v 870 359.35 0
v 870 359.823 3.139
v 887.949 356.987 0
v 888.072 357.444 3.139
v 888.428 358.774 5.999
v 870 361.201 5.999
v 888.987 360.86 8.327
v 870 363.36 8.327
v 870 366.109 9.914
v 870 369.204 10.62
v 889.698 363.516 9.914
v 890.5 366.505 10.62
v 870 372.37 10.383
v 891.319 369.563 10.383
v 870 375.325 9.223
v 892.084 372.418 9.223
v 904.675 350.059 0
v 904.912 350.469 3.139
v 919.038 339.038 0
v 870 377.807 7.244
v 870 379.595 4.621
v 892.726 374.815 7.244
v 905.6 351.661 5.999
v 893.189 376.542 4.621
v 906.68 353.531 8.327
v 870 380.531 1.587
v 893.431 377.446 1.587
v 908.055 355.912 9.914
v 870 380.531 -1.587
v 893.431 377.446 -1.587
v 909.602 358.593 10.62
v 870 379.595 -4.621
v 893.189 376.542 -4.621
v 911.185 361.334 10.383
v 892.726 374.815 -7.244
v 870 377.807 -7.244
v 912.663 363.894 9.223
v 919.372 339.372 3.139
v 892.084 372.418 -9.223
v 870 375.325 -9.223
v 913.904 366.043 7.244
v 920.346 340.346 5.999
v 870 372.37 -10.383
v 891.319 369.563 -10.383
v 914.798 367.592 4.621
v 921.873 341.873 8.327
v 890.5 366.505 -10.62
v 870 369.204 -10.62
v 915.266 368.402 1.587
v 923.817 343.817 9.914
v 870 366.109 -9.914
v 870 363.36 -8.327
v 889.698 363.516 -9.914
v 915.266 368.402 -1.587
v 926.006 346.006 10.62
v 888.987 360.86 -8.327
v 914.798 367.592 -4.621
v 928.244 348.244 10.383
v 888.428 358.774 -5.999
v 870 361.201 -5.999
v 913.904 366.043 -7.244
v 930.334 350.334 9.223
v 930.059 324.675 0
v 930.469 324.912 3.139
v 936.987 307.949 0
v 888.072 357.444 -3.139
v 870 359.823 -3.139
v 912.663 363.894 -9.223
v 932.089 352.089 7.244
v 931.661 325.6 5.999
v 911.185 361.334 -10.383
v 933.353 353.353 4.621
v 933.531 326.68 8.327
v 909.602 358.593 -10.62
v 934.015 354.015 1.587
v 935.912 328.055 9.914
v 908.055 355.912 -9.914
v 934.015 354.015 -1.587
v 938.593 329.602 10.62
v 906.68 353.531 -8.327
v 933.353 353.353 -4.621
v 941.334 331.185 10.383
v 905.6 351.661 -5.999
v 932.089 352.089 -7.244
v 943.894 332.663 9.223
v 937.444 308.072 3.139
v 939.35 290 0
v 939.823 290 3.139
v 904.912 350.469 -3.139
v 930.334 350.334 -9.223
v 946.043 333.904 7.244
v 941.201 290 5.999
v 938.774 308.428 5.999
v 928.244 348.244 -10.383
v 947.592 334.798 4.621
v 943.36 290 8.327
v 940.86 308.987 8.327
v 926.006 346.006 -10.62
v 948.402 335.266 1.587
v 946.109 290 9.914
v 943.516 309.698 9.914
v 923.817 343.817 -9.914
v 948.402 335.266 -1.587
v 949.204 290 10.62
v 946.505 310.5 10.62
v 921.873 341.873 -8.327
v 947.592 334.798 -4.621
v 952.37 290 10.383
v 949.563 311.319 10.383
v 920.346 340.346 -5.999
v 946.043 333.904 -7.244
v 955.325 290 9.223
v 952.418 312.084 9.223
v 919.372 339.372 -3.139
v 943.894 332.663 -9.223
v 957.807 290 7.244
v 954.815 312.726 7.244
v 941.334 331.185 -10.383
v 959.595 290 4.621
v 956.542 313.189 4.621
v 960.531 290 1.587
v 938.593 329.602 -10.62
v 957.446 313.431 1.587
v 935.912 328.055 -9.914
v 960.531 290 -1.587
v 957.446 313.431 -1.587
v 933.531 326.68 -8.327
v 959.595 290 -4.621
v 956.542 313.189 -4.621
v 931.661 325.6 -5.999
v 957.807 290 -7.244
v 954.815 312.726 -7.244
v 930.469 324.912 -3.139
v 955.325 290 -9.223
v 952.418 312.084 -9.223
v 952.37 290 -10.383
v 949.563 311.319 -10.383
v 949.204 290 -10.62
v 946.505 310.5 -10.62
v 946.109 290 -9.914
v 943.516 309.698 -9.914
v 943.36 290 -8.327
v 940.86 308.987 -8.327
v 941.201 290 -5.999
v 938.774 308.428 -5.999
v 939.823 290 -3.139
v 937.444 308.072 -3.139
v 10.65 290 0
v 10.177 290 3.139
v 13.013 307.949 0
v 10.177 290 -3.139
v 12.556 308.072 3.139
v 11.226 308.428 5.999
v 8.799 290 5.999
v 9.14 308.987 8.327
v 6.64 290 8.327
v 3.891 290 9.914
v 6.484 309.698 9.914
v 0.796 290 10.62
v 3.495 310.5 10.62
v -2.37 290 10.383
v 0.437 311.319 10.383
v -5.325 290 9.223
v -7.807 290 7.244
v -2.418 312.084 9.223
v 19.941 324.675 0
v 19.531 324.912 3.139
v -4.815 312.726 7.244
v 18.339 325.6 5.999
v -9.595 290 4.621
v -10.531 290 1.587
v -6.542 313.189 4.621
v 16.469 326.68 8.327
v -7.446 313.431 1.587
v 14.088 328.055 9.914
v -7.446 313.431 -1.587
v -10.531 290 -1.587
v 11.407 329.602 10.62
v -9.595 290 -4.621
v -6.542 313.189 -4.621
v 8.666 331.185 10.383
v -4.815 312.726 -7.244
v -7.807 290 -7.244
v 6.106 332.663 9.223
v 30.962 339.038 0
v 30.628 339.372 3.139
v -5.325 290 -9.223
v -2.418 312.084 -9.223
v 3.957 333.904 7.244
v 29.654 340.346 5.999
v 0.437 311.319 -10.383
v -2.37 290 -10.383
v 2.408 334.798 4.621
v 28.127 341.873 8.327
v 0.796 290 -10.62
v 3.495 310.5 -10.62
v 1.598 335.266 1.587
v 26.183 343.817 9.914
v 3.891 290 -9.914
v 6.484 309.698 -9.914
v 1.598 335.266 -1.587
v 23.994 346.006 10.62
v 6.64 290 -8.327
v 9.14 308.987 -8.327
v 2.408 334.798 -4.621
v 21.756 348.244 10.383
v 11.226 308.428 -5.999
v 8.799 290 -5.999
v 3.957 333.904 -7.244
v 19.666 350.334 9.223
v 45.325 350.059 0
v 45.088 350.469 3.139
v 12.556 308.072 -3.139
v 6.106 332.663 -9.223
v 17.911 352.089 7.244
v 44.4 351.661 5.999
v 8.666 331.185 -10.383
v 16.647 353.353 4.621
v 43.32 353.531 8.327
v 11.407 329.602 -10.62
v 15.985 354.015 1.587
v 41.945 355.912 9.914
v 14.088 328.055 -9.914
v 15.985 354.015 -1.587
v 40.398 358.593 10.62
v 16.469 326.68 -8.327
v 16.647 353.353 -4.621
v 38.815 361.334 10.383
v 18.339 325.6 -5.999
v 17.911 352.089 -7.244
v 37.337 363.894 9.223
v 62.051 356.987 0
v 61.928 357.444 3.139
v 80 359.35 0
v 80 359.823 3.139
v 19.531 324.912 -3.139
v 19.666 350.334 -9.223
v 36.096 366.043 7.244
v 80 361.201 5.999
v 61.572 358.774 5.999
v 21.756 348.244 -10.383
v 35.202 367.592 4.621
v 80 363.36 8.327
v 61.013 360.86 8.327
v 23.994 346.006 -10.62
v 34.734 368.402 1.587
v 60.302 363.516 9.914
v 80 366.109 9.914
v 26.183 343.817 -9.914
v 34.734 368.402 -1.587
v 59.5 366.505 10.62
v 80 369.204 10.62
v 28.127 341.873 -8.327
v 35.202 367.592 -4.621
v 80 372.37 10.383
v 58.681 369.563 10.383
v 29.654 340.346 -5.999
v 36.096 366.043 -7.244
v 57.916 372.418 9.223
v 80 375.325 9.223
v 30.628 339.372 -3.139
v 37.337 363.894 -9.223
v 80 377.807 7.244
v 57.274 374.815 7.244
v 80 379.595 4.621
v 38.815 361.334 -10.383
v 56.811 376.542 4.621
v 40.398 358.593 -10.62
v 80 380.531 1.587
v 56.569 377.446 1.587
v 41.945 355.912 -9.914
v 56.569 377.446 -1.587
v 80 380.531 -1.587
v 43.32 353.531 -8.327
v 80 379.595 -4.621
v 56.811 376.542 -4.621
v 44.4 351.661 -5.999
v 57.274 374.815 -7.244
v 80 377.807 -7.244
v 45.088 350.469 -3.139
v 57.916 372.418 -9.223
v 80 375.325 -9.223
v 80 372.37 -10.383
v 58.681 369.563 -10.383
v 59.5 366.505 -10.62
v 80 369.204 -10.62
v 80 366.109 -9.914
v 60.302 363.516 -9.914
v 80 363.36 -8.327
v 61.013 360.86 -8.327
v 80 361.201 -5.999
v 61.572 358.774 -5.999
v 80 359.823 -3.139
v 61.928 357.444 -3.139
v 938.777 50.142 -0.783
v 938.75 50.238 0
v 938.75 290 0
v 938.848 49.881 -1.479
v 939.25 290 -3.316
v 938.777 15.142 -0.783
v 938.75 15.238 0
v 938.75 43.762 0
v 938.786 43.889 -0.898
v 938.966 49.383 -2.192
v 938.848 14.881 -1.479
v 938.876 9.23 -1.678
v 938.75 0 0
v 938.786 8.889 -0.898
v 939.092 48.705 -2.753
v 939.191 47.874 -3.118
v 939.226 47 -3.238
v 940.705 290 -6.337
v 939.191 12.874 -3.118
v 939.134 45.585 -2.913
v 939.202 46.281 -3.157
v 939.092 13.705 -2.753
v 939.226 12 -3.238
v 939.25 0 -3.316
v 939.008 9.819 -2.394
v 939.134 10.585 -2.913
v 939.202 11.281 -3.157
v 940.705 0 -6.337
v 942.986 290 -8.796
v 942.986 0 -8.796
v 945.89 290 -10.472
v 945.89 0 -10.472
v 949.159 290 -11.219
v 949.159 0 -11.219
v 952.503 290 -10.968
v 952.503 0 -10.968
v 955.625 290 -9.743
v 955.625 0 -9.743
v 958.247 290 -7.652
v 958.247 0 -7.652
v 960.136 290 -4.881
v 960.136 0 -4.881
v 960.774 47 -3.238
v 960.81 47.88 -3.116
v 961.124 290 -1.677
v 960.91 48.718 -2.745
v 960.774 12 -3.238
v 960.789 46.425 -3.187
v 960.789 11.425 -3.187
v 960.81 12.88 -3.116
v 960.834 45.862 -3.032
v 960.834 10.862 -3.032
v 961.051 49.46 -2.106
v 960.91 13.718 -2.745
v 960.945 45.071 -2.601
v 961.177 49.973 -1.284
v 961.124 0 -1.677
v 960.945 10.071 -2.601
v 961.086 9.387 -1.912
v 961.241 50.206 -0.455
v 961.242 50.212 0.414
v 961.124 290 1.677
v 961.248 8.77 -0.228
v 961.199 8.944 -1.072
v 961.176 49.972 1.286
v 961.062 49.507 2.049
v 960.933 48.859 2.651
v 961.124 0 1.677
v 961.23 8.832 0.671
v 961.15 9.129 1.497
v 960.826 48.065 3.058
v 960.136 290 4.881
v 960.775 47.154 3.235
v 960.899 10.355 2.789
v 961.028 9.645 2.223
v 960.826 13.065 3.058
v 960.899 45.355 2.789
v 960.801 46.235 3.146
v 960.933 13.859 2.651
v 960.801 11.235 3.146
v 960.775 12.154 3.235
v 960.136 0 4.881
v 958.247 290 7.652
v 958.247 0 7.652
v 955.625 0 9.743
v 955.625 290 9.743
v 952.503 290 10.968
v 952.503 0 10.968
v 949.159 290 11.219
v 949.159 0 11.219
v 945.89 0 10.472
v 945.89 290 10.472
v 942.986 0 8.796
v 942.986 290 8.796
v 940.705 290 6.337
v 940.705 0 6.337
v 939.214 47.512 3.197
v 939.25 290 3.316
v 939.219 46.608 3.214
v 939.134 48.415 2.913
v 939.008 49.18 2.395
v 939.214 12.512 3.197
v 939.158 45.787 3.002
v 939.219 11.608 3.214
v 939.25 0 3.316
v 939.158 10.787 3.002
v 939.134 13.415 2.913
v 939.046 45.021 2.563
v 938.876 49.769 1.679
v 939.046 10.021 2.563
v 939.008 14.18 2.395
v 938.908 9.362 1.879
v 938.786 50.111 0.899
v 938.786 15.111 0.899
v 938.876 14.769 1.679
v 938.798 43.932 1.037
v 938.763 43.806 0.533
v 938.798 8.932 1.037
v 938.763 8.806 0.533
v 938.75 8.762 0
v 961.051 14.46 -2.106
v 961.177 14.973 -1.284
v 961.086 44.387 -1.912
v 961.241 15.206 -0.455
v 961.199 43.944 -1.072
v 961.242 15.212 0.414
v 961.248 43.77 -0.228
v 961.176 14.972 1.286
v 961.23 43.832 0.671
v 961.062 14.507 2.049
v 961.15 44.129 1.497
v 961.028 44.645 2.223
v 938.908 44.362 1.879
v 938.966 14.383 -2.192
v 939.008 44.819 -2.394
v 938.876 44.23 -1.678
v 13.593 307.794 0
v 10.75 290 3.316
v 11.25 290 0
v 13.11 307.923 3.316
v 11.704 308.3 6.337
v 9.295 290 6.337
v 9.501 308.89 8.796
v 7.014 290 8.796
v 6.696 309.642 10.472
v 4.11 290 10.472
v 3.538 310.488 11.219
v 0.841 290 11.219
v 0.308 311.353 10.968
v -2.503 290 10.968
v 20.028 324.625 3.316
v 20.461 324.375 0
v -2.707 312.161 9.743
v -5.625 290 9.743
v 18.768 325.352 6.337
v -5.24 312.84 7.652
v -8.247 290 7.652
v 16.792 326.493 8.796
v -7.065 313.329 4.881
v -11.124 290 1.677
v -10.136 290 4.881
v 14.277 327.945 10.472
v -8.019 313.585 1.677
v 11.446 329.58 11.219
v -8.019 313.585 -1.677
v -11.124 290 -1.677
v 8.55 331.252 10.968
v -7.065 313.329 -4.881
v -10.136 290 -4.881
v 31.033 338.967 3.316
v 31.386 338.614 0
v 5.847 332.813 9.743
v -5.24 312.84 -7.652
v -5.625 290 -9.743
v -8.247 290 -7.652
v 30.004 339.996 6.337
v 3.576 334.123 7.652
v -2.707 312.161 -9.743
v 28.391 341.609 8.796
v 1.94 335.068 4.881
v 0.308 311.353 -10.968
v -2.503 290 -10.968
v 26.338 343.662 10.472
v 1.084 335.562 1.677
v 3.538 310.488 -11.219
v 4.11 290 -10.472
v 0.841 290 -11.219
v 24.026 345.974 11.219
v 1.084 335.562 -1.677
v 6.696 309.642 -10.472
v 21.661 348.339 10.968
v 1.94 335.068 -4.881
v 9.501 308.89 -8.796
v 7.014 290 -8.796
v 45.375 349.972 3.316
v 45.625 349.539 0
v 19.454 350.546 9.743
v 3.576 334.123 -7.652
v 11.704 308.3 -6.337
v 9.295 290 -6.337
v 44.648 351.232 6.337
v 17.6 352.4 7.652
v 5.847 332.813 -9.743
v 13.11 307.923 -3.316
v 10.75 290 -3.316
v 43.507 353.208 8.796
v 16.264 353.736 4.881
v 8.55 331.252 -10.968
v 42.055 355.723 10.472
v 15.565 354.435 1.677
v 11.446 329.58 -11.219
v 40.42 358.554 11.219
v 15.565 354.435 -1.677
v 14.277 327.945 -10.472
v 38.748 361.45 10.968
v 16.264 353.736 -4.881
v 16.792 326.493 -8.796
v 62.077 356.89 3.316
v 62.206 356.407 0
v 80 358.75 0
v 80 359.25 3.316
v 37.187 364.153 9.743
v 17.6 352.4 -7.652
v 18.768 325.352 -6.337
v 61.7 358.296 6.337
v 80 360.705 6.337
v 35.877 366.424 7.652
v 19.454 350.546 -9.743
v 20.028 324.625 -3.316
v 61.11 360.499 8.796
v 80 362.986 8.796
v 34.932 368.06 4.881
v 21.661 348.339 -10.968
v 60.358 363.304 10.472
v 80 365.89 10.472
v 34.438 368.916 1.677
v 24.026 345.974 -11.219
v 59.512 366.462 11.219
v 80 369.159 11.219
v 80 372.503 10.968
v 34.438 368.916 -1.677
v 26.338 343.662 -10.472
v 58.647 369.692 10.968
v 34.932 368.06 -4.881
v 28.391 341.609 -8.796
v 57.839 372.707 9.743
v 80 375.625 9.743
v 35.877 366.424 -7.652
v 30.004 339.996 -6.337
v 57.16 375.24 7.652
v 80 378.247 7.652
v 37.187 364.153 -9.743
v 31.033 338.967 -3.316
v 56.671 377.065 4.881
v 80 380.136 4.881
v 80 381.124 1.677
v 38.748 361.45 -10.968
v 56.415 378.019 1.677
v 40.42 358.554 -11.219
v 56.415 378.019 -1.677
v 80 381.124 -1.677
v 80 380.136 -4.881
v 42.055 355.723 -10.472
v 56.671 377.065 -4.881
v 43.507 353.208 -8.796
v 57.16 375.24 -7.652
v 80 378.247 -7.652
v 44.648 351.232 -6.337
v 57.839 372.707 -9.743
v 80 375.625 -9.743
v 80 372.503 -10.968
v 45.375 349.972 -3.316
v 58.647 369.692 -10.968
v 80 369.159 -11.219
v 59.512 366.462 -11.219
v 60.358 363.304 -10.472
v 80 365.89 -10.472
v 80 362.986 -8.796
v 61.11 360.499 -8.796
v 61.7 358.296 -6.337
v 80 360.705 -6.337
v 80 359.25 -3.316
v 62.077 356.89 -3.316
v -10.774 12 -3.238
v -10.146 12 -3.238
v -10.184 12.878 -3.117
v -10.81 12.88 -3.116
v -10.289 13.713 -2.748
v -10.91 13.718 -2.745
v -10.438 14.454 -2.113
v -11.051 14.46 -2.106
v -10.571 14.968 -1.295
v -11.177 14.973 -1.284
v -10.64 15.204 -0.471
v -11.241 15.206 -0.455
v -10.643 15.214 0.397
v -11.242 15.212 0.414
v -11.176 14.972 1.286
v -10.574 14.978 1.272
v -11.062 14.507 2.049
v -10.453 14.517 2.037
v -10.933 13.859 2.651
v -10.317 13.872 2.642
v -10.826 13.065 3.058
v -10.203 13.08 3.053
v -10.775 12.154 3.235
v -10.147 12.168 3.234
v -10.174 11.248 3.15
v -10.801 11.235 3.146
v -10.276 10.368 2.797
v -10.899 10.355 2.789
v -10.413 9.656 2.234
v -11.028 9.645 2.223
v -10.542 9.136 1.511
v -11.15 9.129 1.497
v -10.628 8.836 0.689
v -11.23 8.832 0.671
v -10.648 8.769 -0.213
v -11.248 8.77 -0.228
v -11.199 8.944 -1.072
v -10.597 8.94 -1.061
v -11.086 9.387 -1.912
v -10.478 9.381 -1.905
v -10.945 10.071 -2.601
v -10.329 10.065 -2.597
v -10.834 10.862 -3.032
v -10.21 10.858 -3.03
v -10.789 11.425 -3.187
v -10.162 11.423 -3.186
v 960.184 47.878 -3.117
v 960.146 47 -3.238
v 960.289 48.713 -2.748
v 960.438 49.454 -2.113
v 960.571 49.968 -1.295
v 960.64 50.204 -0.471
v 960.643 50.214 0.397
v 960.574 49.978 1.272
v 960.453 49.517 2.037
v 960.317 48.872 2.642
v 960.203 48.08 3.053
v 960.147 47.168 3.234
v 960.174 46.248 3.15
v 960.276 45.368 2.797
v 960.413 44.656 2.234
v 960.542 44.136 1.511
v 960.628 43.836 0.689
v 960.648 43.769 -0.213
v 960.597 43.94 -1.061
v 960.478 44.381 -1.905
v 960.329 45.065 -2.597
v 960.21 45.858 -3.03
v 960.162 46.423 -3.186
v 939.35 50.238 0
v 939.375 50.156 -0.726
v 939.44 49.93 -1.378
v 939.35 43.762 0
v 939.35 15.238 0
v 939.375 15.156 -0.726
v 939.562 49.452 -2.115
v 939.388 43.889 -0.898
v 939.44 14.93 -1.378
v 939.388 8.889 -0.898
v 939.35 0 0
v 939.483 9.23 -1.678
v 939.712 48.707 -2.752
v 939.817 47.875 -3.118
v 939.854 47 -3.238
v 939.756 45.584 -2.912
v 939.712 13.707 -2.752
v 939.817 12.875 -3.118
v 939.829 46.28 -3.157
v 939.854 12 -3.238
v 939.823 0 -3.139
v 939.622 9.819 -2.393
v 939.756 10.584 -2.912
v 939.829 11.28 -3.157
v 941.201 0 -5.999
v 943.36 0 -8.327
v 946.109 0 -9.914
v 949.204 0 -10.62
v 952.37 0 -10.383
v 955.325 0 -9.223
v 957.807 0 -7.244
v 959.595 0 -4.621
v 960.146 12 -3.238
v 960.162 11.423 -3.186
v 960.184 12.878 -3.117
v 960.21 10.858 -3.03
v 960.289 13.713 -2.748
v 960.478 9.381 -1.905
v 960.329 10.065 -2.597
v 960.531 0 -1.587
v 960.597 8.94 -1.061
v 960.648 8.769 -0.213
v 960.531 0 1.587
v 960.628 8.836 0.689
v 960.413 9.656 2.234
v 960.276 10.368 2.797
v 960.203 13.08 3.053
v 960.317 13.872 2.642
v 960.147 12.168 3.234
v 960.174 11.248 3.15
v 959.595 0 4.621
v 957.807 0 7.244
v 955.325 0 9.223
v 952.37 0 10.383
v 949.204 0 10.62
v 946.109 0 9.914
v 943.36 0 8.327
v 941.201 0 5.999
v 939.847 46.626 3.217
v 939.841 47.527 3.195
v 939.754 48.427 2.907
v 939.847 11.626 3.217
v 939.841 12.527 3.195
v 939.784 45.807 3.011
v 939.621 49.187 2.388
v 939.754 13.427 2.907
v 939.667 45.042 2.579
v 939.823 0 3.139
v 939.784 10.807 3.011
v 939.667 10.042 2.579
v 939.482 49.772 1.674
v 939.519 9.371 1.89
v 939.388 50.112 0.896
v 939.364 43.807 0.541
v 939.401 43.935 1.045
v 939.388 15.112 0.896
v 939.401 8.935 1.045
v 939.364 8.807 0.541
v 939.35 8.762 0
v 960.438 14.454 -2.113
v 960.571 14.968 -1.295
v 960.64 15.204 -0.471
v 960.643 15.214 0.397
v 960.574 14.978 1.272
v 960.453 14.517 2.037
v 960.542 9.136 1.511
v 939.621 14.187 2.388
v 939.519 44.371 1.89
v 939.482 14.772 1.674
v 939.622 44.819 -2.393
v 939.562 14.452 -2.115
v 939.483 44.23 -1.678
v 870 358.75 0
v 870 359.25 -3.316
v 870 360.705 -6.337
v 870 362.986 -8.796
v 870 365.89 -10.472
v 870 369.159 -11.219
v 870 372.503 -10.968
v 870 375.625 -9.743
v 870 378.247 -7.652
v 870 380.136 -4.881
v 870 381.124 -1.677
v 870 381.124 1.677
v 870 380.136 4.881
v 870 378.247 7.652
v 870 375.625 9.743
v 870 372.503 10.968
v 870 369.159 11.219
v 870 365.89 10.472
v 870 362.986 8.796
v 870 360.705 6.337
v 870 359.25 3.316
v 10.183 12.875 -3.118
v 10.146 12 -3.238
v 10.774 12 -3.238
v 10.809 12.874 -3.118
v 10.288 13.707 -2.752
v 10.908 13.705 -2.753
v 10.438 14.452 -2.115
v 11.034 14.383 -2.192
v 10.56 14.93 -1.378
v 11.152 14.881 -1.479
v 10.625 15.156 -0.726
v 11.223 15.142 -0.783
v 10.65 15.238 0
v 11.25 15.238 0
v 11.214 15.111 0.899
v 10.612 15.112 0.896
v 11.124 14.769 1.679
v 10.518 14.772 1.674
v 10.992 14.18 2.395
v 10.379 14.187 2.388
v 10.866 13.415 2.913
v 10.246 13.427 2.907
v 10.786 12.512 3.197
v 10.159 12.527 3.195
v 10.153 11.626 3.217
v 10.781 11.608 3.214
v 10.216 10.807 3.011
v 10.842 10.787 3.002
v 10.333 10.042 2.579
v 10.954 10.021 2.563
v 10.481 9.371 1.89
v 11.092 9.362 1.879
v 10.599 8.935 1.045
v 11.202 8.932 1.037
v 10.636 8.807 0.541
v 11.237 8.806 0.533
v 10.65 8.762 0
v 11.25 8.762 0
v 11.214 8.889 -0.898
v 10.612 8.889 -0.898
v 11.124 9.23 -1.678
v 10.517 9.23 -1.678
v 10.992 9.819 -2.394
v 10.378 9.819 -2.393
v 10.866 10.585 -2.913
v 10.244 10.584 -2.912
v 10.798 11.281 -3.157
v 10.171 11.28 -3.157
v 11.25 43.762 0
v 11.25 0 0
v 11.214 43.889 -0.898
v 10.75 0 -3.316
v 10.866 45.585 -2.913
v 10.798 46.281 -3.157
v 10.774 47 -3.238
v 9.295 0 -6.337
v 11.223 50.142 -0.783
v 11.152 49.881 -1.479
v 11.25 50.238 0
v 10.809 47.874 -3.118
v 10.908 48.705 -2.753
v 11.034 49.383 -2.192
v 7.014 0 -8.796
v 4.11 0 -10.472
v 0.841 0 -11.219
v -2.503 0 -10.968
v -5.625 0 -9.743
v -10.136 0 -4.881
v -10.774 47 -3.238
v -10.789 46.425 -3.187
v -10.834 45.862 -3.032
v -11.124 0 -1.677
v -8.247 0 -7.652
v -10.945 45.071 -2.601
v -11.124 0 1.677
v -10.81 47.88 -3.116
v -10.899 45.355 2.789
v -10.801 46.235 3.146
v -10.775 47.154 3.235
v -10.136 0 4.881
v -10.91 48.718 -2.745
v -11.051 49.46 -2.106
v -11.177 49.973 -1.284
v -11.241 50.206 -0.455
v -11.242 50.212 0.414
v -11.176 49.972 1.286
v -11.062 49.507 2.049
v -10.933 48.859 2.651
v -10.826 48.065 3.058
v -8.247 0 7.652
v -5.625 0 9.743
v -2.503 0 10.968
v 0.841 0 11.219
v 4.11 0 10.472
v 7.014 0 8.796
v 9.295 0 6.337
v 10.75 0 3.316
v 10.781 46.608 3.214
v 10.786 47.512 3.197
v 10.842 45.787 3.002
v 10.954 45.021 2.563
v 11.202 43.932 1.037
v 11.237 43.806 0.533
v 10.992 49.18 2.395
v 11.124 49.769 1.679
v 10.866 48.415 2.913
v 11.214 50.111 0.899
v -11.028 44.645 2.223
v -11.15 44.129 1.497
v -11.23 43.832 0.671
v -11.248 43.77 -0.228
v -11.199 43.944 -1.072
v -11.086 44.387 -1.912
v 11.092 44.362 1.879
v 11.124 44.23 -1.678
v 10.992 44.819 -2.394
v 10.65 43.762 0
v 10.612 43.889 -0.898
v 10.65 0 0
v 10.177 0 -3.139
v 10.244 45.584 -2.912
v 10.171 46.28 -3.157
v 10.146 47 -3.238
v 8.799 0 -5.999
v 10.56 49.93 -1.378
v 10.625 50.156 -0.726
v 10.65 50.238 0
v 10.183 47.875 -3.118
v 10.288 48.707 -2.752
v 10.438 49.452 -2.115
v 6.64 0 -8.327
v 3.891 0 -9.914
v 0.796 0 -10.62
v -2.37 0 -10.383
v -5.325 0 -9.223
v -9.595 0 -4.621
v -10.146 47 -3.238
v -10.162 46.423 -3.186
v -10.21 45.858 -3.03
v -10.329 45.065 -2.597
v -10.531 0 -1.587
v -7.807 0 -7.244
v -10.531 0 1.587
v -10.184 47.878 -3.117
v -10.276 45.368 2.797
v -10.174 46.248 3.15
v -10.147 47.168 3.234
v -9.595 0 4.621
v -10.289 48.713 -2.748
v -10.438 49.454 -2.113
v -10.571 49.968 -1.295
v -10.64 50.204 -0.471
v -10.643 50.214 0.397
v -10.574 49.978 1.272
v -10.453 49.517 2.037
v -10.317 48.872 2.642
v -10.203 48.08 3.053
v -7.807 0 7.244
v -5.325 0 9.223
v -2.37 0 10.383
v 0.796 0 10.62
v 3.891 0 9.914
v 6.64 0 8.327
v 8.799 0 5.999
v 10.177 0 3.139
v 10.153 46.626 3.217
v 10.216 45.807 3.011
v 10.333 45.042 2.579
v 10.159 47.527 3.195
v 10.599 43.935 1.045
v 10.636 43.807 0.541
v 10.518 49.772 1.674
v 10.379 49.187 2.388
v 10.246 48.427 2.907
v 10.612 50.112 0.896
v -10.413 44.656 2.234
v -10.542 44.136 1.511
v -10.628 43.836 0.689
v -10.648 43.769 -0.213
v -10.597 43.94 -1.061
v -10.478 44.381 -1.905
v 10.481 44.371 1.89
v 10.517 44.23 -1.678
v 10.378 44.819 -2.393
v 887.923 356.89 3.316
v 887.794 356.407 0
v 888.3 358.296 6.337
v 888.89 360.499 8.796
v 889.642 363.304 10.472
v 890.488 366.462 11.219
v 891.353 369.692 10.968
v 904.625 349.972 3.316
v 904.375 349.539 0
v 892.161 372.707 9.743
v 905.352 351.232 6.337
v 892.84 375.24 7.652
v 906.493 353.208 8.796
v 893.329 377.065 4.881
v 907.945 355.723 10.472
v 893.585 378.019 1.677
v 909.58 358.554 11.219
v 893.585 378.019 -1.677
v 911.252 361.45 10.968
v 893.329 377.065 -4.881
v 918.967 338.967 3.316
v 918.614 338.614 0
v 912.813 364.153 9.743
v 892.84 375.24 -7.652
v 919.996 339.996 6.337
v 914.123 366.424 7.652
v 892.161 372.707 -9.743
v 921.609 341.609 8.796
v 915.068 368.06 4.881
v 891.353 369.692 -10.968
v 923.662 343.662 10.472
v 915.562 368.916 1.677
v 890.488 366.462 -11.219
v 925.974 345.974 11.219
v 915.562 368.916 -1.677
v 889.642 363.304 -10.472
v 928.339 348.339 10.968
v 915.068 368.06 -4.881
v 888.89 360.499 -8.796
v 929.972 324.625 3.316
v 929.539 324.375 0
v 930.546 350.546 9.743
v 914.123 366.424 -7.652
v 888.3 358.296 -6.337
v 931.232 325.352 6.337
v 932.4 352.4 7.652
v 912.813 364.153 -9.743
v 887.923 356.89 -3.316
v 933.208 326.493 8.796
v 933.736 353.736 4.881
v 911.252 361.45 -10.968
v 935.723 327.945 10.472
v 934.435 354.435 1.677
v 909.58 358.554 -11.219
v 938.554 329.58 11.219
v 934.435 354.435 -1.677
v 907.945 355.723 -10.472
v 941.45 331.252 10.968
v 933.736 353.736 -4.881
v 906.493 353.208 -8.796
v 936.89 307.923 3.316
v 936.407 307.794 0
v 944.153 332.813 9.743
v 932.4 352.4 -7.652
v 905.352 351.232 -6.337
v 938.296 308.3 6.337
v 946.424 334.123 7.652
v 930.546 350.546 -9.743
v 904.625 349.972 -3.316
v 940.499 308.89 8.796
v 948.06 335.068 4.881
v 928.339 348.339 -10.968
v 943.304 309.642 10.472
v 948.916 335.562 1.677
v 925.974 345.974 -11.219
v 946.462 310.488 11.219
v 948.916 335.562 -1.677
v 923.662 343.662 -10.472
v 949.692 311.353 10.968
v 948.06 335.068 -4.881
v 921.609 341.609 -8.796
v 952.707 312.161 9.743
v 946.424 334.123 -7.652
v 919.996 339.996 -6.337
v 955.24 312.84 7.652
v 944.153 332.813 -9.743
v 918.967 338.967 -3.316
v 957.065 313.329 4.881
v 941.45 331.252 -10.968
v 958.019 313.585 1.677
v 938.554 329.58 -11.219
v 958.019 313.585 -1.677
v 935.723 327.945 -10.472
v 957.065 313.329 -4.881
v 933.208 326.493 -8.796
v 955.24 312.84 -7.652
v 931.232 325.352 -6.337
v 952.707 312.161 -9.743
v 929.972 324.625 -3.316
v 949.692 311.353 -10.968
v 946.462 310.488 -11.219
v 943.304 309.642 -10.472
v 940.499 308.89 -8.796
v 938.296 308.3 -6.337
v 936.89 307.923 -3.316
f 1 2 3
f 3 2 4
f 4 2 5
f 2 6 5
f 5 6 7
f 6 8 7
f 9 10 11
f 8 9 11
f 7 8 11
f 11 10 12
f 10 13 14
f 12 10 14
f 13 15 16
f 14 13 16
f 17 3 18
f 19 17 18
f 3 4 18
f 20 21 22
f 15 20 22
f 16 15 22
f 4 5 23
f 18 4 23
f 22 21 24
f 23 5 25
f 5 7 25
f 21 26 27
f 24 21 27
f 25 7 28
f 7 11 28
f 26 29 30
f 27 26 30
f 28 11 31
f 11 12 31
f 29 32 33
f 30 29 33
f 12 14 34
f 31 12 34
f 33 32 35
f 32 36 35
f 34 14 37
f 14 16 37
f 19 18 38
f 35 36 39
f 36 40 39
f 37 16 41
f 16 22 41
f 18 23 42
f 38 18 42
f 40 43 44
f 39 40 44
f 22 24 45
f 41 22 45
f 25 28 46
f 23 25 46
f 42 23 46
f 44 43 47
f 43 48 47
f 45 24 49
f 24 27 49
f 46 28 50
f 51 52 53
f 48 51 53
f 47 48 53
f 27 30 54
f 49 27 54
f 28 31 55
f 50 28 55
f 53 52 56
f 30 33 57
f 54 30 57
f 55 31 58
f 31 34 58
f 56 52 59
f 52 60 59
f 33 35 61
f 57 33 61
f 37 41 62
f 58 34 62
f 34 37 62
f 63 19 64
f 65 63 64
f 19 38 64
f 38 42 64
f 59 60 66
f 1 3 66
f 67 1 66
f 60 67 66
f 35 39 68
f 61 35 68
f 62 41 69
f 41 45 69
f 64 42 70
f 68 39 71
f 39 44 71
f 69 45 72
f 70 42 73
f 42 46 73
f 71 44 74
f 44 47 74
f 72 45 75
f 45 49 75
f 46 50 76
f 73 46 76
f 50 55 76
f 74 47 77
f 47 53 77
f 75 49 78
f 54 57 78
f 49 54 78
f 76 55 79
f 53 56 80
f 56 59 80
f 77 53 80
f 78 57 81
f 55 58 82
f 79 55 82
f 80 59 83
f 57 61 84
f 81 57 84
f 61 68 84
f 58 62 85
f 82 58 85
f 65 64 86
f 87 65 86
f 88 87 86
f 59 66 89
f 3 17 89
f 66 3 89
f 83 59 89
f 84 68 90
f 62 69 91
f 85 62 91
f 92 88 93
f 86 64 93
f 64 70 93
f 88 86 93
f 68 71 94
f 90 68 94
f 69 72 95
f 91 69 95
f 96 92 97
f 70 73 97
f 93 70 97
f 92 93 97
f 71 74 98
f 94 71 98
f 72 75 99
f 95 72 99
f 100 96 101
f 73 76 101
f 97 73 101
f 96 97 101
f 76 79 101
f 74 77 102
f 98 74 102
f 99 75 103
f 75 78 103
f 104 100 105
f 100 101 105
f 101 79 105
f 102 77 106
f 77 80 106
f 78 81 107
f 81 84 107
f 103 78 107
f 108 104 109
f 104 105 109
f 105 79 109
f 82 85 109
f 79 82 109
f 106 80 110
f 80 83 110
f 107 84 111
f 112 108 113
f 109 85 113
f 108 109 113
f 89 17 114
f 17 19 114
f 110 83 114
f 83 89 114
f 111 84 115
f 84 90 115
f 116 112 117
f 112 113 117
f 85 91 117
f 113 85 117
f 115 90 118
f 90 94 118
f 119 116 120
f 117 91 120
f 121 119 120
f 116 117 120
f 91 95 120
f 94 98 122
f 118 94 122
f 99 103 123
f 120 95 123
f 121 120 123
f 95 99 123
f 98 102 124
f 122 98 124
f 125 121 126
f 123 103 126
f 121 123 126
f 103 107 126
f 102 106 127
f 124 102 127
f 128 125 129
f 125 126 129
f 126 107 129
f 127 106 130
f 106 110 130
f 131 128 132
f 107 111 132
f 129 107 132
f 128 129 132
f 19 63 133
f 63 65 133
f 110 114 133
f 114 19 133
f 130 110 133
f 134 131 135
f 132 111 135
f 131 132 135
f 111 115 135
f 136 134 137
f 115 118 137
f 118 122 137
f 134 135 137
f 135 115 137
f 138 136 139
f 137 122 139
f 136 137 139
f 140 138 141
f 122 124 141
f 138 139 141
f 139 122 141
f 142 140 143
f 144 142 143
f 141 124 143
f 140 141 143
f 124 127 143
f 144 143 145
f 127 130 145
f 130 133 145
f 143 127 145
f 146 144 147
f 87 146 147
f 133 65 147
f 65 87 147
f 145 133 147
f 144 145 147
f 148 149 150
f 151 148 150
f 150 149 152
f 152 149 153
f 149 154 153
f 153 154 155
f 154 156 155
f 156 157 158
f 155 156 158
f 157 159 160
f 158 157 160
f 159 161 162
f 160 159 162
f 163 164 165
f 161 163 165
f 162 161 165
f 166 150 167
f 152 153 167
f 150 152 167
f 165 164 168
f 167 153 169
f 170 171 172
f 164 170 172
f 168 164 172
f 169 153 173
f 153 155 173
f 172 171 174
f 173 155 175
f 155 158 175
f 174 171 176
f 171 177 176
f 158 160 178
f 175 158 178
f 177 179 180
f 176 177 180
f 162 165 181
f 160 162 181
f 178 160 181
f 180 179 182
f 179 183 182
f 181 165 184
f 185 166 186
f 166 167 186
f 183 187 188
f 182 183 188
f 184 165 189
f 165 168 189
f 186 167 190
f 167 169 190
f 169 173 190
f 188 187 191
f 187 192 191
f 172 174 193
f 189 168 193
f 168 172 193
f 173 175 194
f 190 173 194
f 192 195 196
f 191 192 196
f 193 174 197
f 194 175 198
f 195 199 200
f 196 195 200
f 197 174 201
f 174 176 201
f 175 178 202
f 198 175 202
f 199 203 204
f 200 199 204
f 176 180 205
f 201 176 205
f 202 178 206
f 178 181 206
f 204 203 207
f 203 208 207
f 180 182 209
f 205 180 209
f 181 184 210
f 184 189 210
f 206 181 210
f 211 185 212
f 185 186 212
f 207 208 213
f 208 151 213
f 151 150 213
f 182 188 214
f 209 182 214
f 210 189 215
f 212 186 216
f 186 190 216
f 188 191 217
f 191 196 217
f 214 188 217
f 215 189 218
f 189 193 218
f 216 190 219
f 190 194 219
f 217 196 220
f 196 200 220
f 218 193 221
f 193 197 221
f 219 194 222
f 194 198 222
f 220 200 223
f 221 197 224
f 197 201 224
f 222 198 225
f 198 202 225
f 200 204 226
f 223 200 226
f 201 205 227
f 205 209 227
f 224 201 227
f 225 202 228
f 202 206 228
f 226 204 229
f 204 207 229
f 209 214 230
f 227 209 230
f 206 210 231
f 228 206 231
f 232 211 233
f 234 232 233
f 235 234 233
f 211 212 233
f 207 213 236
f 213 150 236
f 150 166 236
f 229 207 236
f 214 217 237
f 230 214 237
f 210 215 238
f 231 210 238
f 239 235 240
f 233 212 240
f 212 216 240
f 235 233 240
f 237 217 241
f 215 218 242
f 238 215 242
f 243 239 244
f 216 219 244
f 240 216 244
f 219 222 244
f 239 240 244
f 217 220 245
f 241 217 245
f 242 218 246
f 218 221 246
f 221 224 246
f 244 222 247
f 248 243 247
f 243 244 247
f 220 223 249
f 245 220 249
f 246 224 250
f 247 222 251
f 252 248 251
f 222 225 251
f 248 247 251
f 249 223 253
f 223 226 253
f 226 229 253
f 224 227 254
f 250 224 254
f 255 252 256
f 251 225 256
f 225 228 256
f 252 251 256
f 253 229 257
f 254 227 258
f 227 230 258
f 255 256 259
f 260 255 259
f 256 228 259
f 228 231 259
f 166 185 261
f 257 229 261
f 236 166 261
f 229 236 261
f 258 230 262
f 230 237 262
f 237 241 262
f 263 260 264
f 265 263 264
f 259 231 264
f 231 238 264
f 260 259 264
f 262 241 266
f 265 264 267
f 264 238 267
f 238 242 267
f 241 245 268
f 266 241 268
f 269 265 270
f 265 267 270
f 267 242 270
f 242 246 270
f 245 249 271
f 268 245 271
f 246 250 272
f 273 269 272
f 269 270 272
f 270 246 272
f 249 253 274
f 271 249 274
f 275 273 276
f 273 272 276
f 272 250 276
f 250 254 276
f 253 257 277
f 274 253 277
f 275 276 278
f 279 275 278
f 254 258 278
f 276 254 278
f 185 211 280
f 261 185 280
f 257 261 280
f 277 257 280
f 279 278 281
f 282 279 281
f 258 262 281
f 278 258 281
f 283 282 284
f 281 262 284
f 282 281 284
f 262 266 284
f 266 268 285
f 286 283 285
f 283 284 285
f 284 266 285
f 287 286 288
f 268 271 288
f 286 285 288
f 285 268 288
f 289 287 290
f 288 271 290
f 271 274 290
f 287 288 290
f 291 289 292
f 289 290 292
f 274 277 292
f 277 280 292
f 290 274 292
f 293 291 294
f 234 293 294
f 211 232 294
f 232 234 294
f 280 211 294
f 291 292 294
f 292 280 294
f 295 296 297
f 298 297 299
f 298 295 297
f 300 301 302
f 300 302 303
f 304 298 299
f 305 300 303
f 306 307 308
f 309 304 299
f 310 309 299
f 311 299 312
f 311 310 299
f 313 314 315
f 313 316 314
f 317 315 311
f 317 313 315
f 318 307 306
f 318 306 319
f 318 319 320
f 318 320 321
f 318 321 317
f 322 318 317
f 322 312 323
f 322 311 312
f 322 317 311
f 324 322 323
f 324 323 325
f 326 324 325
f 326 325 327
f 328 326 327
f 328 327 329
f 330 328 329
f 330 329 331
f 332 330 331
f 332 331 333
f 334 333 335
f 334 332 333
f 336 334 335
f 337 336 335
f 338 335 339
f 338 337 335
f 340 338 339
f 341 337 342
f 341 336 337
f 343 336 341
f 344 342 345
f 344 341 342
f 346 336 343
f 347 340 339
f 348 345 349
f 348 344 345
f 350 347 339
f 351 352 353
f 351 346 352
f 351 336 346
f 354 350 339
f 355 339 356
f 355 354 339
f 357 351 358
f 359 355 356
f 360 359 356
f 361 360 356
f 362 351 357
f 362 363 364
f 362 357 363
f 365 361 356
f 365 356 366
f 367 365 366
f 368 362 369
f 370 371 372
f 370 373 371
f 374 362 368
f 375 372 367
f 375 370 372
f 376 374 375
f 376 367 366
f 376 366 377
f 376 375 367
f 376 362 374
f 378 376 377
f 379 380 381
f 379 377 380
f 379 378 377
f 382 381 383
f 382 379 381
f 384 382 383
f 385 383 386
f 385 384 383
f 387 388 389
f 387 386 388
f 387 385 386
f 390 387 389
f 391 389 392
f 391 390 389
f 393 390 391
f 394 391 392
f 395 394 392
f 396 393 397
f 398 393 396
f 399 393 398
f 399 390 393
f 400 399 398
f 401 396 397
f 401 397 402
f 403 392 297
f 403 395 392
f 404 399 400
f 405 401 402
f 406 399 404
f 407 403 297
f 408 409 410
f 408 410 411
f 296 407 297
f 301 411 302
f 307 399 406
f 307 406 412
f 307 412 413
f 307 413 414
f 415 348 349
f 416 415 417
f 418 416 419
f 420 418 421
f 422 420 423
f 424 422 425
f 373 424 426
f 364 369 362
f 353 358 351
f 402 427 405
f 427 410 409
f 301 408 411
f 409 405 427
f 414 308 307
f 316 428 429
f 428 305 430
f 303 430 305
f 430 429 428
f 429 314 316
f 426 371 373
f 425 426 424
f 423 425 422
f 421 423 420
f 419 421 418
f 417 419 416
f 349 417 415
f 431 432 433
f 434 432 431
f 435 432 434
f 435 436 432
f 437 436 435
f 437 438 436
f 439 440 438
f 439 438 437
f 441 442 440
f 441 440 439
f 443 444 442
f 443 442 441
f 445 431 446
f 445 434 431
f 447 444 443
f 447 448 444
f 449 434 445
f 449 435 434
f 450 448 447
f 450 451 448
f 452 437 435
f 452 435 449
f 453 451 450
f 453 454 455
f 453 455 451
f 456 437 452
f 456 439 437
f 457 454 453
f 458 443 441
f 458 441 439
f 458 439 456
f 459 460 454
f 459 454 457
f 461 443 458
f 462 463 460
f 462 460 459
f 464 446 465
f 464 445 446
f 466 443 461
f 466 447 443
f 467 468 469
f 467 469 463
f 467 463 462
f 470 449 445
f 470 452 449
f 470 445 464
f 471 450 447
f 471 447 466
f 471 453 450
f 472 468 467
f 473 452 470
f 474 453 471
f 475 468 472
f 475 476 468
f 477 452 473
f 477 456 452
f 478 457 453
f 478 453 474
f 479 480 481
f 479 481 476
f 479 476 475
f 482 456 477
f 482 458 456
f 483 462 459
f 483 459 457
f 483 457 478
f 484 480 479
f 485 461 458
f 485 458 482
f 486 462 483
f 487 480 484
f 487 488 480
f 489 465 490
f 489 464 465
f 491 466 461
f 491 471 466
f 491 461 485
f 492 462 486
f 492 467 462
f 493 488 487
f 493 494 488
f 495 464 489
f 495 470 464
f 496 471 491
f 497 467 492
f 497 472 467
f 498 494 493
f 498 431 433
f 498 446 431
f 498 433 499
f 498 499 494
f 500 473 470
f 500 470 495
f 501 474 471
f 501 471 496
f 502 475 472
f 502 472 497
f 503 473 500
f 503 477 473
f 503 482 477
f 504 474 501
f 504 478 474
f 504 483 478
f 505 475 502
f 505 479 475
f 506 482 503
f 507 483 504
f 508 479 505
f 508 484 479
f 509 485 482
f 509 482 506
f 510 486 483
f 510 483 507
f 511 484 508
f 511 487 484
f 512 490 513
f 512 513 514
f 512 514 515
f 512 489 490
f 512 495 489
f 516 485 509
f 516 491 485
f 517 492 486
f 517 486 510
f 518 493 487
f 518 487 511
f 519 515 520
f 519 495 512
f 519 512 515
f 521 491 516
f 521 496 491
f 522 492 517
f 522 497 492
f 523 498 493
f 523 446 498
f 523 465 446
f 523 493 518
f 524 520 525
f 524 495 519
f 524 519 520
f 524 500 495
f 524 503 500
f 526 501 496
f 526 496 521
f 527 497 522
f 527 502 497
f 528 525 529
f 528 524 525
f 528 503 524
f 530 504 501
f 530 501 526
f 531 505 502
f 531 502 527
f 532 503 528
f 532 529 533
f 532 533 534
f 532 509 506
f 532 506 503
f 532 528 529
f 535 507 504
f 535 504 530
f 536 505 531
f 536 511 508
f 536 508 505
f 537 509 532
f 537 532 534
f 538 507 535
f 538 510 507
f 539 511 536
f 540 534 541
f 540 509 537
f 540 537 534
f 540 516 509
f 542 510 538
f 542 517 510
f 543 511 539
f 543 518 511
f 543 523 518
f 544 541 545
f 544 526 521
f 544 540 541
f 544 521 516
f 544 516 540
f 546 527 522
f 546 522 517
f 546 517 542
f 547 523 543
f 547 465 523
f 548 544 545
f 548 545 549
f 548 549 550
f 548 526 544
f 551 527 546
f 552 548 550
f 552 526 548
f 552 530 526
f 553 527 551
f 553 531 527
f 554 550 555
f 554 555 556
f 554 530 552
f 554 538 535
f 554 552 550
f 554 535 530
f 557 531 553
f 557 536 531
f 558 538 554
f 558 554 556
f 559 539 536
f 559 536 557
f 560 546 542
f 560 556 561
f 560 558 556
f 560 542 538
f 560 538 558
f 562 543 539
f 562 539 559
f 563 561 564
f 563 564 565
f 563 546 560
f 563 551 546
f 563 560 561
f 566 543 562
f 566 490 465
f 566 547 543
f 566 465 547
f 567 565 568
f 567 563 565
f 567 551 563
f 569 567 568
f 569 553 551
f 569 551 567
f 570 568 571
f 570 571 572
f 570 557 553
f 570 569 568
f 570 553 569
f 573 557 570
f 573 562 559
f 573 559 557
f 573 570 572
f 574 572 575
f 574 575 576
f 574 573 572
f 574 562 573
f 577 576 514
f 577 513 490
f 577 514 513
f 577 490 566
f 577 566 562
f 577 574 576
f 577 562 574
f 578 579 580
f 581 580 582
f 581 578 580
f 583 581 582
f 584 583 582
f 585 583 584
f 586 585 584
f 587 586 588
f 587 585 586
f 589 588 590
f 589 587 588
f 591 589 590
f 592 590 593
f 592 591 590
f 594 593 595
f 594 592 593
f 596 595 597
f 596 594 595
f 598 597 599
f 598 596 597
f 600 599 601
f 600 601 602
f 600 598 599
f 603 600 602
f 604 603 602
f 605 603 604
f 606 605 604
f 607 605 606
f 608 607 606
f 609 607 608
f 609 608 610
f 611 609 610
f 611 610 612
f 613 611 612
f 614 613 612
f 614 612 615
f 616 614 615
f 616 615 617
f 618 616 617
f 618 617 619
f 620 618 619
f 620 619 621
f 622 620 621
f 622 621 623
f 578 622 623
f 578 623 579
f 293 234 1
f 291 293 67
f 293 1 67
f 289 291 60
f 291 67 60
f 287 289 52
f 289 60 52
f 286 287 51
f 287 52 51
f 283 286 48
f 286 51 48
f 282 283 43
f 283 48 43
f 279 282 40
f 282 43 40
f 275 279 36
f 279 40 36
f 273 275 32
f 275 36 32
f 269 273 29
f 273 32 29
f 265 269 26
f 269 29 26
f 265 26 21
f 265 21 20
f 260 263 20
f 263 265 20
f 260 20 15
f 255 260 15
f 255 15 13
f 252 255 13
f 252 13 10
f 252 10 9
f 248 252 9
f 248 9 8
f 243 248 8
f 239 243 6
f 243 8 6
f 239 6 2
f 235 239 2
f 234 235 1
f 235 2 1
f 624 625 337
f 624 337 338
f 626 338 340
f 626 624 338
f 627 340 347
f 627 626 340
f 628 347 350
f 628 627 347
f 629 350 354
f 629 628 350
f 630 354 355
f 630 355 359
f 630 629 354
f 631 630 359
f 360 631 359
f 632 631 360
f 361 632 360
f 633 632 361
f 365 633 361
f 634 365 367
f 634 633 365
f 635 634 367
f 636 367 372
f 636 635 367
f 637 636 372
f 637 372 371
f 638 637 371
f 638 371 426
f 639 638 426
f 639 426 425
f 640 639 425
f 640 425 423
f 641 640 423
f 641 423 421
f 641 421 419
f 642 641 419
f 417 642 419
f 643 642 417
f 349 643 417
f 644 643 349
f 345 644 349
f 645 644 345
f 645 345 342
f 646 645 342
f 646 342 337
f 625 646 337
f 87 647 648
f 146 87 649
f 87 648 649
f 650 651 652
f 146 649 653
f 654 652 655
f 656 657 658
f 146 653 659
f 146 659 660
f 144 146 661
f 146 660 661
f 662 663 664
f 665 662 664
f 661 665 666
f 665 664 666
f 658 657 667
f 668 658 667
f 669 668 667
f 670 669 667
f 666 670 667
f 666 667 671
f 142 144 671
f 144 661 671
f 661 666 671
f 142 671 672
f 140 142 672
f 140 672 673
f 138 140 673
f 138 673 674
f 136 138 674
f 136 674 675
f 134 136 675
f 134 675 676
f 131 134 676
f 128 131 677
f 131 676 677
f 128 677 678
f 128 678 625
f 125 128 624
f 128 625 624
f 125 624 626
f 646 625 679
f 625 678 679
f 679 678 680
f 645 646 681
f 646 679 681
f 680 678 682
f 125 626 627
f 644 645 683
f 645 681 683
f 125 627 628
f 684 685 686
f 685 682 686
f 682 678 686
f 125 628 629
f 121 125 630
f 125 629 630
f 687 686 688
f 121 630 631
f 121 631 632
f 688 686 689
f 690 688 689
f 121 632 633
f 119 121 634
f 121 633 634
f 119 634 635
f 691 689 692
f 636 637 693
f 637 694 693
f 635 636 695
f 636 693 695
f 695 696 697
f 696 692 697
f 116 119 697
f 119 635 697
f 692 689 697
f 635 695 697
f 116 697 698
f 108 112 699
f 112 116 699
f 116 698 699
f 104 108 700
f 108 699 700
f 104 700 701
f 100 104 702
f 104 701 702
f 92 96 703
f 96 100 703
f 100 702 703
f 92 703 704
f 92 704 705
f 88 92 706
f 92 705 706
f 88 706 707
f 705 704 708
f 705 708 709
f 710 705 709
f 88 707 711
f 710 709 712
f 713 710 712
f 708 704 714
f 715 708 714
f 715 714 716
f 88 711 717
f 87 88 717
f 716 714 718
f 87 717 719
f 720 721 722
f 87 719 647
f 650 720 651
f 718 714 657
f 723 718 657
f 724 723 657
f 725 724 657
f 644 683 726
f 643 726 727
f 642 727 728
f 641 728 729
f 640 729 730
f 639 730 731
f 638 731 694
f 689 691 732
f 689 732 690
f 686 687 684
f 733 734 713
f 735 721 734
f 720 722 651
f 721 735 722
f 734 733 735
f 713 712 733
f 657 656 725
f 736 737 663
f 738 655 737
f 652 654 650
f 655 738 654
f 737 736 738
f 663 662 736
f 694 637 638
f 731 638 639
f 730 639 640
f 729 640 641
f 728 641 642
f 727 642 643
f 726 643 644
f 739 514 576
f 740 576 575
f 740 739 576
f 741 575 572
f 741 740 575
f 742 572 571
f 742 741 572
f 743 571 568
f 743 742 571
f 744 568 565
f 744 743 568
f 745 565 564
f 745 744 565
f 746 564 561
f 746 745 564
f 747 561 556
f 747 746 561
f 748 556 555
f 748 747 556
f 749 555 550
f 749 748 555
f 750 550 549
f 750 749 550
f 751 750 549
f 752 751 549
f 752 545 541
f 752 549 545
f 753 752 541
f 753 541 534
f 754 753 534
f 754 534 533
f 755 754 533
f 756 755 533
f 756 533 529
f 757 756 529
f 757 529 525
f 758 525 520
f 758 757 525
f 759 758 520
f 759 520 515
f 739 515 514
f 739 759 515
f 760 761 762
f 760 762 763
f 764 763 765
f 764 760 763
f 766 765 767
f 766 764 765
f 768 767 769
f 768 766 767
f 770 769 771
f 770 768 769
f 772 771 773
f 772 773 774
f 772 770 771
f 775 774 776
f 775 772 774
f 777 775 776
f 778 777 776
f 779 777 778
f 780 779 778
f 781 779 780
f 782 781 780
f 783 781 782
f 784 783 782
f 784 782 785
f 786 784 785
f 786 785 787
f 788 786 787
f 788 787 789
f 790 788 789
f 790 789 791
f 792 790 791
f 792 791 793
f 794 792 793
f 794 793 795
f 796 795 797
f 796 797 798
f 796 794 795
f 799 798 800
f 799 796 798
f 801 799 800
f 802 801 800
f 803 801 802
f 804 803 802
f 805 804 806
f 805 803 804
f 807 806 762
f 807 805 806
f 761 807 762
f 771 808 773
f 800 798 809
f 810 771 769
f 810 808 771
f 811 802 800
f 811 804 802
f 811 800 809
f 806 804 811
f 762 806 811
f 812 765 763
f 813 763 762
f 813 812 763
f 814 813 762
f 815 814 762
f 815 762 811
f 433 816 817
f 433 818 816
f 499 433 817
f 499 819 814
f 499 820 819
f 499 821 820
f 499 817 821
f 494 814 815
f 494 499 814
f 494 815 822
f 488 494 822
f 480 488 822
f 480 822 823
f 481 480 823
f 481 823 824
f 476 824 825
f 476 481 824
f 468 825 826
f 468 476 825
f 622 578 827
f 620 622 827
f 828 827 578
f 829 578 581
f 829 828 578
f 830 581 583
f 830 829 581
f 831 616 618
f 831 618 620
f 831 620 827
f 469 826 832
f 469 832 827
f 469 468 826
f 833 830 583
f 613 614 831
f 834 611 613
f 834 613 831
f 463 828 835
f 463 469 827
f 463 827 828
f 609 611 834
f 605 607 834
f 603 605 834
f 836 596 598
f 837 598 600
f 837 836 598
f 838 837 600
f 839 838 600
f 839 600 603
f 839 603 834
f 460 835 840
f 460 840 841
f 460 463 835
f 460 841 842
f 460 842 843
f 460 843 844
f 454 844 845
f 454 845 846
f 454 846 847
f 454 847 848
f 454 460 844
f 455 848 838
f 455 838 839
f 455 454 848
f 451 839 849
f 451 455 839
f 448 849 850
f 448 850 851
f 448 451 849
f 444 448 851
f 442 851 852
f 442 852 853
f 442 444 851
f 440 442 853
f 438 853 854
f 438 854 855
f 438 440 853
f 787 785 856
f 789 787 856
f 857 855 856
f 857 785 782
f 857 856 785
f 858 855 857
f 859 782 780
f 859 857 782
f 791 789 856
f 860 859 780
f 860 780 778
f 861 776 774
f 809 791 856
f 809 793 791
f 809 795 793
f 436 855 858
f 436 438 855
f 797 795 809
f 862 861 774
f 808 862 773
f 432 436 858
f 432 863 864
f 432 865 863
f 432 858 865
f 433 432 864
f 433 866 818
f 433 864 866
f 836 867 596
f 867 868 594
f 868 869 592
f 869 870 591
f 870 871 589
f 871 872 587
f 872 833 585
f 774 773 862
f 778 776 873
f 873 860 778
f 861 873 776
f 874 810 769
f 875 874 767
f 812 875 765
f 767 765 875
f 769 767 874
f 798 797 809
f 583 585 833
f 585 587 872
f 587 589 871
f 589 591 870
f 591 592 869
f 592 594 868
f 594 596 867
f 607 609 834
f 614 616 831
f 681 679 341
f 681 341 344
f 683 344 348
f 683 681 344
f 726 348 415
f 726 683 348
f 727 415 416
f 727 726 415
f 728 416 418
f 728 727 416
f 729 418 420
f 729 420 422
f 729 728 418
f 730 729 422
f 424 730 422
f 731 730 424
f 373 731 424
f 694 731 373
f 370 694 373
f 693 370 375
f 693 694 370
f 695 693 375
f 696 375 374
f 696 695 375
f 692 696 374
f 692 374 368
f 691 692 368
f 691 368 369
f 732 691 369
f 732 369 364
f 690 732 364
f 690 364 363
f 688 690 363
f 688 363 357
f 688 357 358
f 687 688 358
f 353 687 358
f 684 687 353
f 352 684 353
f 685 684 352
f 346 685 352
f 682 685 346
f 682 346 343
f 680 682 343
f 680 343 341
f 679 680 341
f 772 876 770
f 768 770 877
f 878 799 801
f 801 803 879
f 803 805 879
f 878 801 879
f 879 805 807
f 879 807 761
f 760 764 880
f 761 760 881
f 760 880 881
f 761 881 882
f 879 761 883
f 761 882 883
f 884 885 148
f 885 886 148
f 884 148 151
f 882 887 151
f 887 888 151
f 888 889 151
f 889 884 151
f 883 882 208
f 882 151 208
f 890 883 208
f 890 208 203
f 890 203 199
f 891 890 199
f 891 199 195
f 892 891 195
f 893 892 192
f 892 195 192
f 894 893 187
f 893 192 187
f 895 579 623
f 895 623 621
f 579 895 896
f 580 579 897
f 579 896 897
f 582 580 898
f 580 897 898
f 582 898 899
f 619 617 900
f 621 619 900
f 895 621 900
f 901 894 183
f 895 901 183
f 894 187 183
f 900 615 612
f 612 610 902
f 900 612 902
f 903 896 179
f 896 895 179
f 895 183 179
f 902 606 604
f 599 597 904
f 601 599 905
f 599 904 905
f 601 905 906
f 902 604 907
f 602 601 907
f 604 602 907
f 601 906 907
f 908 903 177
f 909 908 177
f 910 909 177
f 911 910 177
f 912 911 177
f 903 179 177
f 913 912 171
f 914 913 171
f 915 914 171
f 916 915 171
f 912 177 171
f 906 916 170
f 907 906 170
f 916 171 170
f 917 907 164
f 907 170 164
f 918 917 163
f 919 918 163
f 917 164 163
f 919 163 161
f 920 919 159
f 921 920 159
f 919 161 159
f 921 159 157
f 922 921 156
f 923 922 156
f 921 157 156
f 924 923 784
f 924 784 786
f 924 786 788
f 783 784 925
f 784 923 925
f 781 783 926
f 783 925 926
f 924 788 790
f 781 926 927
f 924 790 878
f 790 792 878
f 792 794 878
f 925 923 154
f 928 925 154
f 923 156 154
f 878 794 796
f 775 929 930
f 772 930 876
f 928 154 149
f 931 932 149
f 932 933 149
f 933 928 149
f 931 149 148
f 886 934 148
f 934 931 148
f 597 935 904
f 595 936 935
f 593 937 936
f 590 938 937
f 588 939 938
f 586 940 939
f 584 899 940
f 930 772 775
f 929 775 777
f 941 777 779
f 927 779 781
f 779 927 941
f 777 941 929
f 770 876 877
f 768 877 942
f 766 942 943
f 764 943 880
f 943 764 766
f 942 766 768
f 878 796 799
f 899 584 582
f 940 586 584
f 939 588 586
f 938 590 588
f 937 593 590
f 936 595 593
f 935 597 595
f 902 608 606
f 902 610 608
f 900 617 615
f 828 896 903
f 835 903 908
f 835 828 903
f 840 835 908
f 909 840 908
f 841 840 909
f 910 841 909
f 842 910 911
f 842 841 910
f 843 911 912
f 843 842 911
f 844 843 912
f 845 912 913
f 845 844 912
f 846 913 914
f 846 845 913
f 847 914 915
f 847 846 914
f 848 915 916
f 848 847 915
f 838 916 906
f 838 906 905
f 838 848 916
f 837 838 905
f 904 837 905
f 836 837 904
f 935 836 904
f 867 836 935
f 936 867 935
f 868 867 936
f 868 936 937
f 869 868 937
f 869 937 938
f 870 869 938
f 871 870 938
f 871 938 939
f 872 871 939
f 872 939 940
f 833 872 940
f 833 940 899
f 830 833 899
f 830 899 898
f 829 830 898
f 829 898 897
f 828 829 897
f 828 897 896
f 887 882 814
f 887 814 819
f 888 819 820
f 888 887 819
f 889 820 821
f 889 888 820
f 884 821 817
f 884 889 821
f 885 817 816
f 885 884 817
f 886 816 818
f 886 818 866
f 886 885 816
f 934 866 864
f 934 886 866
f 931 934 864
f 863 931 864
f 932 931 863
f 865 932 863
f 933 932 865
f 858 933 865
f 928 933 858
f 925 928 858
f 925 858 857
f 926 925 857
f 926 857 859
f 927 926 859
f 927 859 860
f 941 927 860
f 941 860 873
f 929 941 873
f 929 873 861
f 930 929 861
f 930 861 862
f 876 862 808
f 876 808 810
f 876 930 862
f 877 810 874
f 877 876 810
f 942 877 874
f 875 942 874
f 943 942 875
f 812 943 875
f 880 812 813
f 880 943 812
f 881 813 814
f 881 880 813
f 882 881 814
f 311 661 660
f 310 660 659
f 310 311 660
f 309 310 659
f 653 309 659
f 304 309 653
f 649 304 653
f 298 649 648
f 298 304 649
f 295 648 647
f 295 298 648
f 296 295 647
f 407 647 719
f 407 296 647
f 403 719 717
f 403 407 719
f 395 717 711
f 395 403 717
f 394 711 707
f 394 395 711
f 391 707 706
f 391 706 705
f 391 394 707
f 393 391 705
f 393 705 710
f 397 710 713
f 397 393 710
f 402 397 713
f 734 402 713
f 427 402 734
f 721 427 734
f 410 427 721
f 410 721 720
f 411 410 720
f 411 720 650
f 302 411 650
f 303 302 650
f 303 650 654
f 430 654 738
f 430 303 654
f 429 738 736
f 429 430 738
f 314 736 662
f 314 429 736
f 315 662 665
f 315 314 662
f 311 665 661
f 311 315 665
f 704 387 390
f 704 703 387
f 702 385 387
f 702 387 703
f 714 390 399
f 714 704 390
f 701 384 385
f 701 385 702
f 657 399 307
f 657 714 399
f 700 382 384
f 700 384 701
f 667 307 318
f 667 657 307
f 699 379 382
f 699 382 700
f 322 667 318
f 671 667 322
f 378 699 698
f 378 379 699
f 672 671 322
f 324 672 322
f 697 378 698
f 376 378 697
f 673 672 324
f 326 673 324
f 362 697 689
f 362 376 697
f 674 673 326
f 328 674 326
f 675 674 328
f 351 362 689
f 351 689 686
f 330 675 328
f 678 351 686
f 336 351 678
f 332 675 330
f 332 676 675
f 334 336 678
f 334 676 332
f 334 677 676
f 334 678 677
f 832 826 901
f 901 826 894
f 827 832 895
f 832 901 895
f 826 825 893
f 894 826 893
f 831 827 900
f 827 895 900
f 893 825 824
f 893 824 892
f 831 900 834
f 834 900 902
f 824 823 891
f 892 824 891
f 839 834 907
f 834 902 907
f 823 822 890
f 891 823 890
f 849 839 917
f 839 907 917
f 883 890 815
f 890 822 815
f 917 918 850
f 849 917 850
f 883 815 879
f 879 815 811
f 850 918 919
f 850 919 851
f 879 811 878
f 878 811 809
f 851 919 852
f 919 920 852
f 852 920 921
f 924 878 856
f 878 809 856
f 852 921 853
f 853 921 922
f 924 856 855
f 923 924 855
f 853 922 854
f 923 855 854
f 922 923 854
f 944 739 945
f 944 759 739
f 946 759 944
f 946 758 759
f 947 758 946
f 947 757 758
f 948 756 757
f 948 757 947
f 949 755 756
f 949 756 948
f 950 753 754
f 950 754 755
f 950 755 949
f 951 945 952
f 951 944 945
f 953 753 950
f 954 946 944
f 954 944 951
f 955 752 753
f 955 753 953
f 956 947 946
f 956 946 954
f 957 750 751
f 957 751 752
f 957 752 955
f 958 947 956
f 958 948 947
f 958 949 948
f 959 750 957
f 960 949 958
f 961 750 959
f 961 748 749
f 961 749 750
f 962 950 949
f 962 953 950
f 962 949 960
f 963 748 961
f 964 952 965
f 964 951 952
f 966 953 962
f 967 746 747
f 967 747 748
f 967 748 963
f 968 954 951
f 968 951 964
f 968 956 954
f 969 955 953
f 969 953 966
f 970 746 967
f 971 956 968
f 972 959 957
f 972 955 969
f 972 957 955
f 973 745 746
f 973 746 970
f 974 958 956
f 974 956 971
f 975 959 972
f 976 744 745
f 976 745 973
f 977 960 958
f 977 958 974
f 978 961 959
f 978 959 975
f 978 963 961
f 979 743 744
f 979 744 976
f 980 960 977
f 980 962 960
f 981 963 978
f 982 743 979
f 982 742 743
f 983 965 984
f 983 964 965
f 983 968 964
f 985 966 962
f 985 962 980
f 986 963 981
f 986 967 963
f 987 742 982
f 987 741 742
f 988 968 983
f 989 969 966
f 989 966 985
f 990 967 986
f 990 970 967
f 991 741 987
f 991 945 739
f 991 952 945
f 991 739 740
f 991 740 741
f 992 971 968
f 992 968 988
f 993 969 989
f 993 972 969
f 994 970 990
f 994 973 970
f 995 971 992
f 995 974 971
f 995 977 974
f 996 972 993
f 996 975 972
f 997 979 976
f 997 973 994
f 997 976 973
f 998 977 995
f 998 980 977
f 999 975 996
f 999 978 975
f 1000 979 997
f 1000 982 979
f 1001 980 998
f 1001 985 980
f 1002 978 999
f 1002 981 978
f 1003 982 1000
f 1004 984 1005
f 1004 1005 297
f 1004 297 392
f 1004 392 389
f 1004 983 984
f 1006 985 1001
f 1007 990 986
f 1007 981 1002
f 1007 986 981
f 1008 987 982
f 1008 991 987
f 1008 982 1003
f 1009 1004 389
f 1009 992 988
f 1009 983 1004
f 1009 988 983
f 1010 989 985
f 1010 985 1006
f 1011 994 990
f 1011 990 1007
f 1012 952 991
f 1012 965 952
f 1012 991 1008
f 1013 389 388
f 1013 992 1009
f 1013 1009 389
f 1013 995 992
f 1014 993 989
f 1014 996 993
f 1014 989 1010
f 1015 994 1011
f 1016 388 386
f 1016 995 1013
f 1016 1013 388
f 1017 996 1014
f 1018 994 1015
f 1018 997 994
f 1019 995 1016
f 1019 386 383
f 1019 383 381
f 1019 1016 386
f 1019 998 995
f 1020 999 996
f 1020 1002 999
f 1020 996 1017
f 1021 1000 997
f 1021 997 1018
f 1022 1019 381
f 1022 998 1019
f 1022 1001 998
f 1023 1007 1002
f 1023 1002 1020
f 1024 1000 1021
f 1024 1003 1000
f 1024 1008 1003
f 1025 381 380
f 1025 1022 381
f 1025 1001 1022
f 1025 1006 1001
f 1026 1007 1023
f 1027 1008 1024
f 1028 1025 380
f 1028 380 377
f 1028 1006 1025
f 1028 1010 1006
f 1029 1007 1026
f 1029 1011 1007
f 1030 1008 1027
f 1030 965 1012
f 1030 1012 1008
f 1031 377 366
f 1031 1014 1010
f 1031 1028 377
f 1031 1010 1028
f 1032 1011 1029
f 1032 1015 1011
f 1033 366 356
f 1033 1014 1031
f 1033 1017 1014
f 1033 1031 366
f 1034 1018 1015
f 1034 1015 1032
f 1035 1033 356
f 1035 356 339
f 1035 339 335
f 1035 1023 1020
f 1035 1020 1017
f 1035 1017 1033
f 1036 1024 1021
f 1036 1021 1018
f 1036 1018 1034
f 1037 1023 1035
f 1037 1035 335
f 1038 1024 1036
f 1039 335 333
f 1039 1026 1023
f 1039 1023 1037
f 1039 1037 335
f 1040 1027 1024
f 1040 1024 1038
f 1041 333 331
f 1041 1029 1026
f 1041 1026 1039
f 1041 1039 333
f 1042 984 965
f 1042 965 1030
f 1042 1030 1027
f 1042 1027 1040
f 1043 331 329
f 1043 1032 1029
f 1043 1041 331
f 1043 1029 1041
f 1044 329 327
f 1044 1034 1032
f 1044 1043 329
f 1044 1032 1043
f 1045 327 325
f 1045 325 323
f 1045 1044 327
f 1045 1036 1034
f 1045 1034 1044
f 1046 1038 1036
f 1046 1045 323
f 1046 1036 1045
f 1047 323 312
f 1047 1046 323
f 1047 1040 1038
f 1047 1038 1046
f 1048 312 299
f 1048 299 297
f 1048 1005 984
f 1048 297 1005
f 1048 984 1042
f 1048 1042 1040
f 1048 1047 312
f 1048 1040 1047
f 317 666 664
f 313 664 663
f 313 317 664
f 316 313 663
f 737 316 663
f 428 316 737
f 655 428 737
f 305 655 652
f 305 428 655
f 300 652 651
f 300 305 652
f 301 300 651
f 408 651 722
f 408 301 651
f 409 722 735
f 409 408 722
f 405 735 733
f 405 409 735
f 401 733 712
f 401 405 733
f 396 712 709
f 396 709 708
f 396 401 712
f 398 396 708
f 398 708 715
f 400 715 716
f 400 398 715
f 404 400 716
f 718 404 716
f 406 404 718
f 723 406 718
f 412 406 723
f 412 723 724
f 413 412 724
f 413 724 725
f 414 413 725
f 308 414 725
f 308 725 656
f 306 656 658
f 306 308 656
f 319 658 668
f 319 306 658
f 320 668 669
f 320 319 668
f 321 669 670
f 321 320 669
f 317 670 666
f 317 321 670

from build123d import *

# Parameters (mm, degrees)
SKETCH2_R               = 11.25
SKETCH2_R_2             = 10.65
CUT_EXTRUDE1_DEPTH      = 1035.156510288
CUT_EXTRUDE1_DEPTH_BACK = 1035.156510288
SKETCH3_R               = 3.238231215


with BuildPart() as part:
    # Sweep1: sweep along a path in Sketch1
    with BuildLine(Plane.XY) as sweep1_path:
        Line((0, 0), (0, 290))
        ThreePointArc((0, 290), (23.431457505, 346.568542495), (80, 370))
        Line((80, 370), (870, 370))
        ThreePointArc((870, 370), (926.568542495, 346.568542495), (950, 290))
        Line((950, 290), (950, 0))
    # Sketch2 → Sweep1 (sweep)
    with BuildSketch(Plane(origin=(0, 0, 0), x_dir=(1, 0, 0), z_dir=(0, 1, 0))):
        Circle(SKETCH2_R)
        Circle(SKETCH2_R_2, mode=Mode.SUBTRACT)
    sweep(path=sweep1_path.line)

    # Sketch3 → Cut-Extrude1 (cut, two sides: drawn at the far end of the back side and taken through both)
    with BuildSketch(Plane(origin=(0, 0, 0), x_dir=(0, 0, -1), z_dir=(1, 0, 0)).offset(-CUT_EXTRUDE1_DEPTH_BACK)):
        with Locations((0, 12)):
            Circle(SKETCH3_R)
        with Locations((0, 47)):
            Circle(SKETCH3_R)
    extrude(amount=CUT_EXTRUDE1_DEPTH + CUT_EXTRUDE1_DEPTH_BACK, mode=Mode.SUBTRACT)


solid = part.part
